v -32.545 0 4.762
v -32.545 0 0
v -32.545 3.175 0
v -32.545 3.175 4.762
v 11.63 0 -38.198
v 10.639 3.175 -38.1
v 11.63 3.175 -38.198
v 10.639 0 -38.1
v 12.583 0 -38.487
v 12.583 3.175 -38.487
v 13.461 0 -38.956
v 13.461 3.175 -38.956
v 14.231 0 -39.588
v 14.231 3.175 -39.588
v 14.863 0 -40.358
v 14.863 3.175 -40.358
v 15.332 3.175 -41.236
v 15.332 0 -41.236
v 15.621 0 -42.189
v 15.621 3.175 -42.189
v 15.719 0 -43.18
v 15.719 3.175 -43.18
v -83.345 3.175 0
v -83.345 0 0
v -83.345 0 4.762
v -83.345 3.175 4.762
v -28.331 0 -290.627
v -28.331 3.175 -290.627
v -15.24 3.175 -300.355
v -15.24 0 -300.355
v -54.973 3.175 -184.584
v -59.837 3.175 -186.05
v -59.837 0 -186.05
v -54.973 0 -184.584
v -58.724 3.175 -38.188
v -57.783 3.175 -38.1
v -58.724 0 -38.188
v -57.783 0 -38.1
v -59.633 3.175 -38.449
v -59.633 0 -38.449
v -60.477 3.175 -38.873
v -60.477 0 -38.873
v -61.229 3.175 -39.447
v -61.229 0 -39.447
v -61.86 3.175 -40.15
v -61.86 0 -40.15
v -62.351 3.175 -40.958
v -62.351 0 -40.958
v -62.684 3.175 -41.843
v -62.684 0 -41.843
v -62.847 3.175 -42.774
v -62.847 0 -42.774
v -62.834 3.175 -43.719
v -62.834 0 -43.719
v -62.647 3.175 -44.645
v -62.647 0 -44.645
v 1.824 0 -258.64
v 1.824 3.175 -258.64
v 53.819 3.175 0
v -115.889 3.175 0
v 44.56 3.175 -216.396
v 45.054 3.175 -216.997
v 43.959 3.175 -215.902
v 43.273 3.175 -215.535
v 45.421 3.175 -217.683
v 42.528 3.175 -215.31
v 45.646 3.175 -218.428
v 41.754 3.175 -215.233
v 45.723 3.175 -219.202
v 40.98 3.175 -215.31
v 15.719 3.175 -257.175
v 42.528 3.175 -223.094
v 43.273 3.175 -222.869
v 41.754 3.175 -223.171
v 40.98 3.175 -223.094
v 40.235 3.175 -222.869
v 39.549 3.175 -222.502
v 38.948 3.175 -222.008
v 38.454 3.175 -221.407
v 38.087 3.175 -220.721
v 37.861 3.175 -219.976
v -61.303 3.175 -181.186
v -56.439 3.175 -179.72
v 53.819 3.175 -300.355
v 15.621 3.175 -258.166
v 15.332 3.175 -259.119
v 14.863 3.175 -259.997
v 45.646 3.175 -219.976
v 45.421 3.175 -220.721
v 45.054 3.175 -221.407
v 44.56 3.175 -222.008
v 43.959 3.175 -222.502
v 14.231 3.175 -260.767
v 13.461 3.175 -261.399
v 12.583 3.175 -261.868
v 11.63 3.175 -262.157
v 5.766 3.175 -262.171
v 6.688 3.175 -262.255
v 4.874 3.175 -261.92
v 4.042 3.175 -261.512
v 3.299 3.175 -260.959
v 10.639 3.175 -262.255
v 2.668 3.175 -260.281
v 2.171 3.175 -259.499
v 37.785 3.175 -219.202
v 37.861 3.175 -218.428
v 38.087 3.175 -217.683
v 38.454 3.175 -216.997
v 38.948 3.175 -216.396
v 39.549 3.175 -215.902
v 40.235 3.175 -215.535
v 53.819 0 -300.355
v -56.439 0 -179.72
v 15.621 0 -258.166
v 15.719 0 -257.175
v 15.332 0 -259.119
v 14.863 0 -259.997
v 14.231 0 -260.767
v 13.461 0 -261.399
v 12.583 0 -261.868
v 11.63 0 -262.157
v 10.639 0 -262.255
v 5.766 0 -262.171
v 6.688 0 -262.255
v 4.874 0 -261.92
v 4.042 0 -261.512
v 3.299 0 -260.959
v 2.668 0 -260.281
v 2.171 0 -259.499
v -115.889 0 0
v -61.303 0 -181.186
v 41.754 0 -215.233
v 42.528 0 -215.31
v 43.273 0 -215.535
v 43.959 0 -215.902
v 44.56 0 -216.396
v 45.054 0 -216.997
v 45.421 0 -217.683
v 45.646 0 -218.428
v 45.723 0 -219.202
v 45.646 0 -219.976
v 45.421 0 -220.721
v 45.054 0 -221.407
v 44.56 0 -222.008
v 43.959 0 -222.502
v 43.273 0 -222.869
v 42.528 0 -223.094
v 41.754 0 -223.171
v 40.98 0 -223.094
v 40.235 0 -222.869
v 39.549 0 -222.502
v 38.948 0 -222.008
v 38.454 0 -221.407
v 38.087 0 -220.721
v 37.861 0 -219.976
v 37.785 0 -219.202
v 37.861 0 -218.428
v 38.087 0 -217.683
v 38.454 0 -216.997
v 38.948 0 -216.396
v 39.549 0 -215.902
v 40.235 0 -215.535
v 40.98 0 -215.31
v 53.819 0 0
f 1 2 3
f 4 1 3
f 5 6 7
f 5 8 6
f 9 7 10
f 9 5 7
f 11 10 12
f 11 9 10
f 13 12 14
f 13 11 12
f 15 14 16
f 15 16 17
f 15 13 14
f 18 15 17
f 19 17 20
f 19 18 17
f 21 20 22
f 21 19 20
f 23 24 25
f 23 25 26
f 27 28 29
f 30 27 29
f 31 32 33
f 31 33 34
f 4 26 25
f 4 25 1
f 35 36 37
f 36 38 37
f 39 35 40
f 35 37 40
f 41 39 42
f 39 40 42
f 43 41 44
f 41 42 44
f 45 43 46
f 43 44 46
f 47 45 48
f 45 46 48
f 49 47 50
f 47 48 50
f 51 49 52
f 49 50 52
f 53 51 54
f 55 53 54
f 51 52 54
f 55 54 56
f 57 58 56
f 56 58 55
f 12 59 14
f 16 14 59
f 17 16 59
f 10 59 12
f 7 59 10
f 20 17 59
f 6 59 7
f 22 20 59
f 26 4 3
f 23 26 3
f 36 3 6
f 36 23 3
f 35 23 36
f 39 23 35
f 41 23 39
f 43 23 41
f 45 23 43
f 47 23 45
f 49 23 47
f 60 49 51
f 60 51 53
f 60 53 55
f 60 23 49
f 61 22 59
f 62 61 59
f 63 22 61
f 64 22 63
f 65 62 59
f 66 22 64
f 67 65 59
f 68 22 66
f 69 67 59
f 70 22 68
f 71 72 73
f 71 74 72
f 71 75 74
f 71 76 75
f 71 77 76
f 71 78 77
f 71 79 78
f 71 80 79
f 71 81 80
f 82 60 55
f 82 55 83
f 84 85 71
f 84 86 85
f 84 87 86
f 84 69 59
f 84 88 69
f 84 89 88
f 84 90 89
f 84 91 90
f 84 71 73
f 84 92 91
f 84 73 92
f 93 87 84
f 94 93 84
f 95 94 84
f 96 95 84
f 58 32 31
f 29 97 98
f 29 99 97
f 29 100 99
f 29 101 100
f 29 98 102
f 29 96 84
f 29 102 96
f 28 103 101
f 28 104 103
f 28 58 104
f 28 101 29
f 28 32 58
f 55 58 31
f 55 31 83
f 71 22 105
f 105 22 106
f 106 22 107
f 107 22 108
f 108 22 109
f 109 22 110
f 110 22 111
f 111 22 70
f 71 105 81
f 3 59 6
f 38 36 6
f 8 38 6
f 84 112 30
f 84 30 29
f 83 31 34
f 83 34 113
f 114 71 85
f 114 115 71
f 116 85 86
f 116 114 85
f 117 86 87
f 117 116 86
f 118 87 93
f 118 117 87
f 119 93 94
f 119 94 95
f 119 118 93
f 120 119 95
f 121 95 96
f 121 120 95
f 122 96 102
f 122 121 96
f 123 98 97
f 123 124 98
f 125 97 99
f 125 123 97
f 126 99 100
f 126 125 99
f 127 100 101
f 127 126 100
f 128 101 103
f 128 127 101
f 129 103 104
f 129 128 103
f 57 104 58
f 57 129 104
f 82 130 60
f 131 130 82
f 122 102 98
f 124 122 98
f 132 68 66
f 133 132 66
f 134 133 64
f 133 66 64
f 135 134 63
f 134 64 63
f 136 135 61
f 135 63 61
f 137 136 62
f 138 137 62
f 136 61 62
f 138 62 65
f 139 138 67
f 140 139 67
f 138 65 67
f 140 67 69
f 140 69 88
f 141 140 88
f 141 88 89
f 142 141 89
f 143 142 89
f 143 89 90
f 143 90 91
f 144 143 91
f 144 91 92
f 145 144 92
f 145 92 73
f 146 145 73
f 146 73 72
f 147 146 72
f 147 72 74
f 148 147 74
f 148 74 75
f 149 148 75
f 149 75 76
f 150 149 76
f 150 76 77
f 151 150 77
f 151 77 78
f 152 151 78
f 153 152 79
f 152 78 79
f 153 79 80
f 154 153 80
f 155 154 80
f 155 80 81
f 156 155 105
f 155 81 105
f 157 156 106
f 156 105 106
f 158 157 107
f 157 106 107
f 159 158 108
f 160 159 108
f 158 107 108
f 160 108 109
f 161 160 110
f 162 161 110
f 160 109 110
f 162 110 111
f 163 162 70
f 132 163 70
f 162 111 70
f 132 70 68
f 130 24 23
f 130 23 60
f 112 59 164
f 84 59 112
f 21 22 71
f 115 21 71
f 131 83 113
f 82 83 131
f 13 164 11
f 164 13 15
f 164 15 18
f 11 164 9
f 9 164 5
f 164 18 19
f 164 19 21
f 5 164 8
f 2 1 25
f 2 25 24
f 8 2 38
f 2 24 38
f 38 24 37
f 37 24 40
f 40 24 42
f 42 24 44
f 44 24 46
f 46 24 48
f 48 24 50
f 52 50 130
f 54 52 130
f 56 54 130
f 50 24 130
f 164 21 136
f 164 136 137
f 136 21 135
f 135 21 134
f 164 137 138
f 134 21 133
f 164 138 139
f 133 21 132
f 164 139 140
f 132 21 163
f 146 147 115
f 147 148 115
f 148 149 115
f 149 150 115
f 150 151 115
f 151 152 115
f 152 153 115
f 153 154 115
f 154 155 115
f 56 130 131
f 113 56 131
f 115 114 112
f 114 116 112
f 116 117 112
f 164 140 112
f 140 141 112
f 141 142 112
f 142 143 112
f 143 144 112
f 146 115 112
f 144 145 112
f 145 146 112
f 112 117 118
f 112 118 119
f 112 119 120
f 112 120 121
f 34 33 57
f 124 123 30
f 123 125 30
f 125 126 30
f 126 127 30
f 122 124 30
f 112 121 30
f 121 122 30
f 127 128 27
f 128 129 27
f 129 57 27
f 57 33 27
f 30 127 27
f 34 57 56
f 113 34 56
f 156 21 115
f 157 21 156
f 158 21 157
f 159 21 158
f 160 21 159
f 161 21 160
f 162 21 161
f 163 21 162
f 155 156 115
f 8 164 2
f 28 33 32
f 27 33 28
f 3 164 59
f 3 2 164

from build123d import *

# Parameters (mm, degrees)
BOSS_EXTRUDE1_DEPTH = 3.175
SKETCH4_W           = 50.8
SKETCH4_H           = 3.175
BOSS_EXTRUDE2_DEPTH = 4.7625
SKETCH6_W           = 300.355
SKETCH6_H           = 3.175
BOSS_EXTRUDE3_DEPTH = 53.8189678
SKETCH7_R           = 3.96875
CUT_EXTRUDE3_DEPTH  = 322.952646539
CUT_EXTRUDE4_DEPTH  = 322.952646539
FILLET1_R           = 5.08
CUT_EXTRUDE5_DEPTH  = 322.952646539


with BuildPart() as part:
    # Sketch2 → Boss-Extrude1 (new body)
    with BuildSketch(Plane(origin=(0, 0, 0), x_dir=(1, 0, 0), z_dir=(0, 1, 0))):
        Polygon((0, 0), (-115.889171037, 0), (-25.4, 300.355), (0, 300.355), align=None)
    extrude(amount=BOSS_EXTRUDE1_DEPTH)

    # Sketch4 → Boss-Extrude2 (add)
    with BuildSketch(Plane.XY):
        with Locations((-57.944585519, 1.5875)):
            Rectangle(SKETCH4_W, SKETCH4_H)
    extrude(amount=BOSS_EXTRUDE2_DEPTH)

    # Sketch6 → Boss-Extrude3 (add)
    with BuildSketch(Plane(origin=(0, 0, 0), x_dir=(0, 0, -1), z_dir=(1, 0, 0))):
        with Locations((150.1775, 1.5875)):
            Rectangle(SKETCH6_W, SKETCH6_H)
    extrude(amount=BOSS_EXTRUDE3_DEPTH)

    # Sketch7 → Cut-Extrude3 (cut, through all)
    with BuildSketch(Plane(origin=(0, 3.175, 0), x_dir=(1, 0, 0), z_dir=(0, 1, 0))):
        with Locations(Location((41.7539678, 219.202, 0), (0, 0, 270))):
            Circle(SKETCH7_R)
        Polygon((-28.330823353, 290.626902834), (-15.24, 300.355), (-25.4, 300.355), align=None)
    extrude(amount=-CUT_EXTRUDE3_DEPTH, mode=Mode.SUBTRACT)

    # Sketch8 → Cut-Extrude4 (cut, through all)
    with BuildSketch(Plane(origin=(0, 3.175, 0), x_dir=(1, 0, 0), z_dir=(0, 1, 0))):
        Polygon((-64.619085916, 38.1), (15.7189678, 38.1), (15.7189678, 262.255), (2.91300156, 262.255), align=None)
    extrude(amount=-CUT_EXTRUDE4_DEPTH, mode=Mode.SUBTRACT)

    # Fillet1
    fillet1_edges = [part.edges().sort_by_distance(p)[0] for p in [
        (-64.619085916, 1.5875, -38.1),
        (2.91300156, 1.5875, -262.255),
        (15.7189678, 1.5875, -262.255),
        (15.7189678, 1.5875, -38.1),
    ]]
    fillet(fillet1_edges, radius=FILLET1_R)

    # Sketch9 → Cut-Extrude5 (cut, through all)
    with BuildSketch(Plane(origin=(0, 3.175, 0), x_dir=(1, 0, 0), z_dir=(0, 1, 0))):
        Polygon((-59.837174403, 186.0498583), (-54.97312582, 184.584446623), (-56.438537497, 179.72039804), (-61.30258608, 181.185809717), align=None)
    extrude(amount=-CUT_EXTRUDE5_DEPTH, mode=Mode.SUBTRACT)


solid = part.part
